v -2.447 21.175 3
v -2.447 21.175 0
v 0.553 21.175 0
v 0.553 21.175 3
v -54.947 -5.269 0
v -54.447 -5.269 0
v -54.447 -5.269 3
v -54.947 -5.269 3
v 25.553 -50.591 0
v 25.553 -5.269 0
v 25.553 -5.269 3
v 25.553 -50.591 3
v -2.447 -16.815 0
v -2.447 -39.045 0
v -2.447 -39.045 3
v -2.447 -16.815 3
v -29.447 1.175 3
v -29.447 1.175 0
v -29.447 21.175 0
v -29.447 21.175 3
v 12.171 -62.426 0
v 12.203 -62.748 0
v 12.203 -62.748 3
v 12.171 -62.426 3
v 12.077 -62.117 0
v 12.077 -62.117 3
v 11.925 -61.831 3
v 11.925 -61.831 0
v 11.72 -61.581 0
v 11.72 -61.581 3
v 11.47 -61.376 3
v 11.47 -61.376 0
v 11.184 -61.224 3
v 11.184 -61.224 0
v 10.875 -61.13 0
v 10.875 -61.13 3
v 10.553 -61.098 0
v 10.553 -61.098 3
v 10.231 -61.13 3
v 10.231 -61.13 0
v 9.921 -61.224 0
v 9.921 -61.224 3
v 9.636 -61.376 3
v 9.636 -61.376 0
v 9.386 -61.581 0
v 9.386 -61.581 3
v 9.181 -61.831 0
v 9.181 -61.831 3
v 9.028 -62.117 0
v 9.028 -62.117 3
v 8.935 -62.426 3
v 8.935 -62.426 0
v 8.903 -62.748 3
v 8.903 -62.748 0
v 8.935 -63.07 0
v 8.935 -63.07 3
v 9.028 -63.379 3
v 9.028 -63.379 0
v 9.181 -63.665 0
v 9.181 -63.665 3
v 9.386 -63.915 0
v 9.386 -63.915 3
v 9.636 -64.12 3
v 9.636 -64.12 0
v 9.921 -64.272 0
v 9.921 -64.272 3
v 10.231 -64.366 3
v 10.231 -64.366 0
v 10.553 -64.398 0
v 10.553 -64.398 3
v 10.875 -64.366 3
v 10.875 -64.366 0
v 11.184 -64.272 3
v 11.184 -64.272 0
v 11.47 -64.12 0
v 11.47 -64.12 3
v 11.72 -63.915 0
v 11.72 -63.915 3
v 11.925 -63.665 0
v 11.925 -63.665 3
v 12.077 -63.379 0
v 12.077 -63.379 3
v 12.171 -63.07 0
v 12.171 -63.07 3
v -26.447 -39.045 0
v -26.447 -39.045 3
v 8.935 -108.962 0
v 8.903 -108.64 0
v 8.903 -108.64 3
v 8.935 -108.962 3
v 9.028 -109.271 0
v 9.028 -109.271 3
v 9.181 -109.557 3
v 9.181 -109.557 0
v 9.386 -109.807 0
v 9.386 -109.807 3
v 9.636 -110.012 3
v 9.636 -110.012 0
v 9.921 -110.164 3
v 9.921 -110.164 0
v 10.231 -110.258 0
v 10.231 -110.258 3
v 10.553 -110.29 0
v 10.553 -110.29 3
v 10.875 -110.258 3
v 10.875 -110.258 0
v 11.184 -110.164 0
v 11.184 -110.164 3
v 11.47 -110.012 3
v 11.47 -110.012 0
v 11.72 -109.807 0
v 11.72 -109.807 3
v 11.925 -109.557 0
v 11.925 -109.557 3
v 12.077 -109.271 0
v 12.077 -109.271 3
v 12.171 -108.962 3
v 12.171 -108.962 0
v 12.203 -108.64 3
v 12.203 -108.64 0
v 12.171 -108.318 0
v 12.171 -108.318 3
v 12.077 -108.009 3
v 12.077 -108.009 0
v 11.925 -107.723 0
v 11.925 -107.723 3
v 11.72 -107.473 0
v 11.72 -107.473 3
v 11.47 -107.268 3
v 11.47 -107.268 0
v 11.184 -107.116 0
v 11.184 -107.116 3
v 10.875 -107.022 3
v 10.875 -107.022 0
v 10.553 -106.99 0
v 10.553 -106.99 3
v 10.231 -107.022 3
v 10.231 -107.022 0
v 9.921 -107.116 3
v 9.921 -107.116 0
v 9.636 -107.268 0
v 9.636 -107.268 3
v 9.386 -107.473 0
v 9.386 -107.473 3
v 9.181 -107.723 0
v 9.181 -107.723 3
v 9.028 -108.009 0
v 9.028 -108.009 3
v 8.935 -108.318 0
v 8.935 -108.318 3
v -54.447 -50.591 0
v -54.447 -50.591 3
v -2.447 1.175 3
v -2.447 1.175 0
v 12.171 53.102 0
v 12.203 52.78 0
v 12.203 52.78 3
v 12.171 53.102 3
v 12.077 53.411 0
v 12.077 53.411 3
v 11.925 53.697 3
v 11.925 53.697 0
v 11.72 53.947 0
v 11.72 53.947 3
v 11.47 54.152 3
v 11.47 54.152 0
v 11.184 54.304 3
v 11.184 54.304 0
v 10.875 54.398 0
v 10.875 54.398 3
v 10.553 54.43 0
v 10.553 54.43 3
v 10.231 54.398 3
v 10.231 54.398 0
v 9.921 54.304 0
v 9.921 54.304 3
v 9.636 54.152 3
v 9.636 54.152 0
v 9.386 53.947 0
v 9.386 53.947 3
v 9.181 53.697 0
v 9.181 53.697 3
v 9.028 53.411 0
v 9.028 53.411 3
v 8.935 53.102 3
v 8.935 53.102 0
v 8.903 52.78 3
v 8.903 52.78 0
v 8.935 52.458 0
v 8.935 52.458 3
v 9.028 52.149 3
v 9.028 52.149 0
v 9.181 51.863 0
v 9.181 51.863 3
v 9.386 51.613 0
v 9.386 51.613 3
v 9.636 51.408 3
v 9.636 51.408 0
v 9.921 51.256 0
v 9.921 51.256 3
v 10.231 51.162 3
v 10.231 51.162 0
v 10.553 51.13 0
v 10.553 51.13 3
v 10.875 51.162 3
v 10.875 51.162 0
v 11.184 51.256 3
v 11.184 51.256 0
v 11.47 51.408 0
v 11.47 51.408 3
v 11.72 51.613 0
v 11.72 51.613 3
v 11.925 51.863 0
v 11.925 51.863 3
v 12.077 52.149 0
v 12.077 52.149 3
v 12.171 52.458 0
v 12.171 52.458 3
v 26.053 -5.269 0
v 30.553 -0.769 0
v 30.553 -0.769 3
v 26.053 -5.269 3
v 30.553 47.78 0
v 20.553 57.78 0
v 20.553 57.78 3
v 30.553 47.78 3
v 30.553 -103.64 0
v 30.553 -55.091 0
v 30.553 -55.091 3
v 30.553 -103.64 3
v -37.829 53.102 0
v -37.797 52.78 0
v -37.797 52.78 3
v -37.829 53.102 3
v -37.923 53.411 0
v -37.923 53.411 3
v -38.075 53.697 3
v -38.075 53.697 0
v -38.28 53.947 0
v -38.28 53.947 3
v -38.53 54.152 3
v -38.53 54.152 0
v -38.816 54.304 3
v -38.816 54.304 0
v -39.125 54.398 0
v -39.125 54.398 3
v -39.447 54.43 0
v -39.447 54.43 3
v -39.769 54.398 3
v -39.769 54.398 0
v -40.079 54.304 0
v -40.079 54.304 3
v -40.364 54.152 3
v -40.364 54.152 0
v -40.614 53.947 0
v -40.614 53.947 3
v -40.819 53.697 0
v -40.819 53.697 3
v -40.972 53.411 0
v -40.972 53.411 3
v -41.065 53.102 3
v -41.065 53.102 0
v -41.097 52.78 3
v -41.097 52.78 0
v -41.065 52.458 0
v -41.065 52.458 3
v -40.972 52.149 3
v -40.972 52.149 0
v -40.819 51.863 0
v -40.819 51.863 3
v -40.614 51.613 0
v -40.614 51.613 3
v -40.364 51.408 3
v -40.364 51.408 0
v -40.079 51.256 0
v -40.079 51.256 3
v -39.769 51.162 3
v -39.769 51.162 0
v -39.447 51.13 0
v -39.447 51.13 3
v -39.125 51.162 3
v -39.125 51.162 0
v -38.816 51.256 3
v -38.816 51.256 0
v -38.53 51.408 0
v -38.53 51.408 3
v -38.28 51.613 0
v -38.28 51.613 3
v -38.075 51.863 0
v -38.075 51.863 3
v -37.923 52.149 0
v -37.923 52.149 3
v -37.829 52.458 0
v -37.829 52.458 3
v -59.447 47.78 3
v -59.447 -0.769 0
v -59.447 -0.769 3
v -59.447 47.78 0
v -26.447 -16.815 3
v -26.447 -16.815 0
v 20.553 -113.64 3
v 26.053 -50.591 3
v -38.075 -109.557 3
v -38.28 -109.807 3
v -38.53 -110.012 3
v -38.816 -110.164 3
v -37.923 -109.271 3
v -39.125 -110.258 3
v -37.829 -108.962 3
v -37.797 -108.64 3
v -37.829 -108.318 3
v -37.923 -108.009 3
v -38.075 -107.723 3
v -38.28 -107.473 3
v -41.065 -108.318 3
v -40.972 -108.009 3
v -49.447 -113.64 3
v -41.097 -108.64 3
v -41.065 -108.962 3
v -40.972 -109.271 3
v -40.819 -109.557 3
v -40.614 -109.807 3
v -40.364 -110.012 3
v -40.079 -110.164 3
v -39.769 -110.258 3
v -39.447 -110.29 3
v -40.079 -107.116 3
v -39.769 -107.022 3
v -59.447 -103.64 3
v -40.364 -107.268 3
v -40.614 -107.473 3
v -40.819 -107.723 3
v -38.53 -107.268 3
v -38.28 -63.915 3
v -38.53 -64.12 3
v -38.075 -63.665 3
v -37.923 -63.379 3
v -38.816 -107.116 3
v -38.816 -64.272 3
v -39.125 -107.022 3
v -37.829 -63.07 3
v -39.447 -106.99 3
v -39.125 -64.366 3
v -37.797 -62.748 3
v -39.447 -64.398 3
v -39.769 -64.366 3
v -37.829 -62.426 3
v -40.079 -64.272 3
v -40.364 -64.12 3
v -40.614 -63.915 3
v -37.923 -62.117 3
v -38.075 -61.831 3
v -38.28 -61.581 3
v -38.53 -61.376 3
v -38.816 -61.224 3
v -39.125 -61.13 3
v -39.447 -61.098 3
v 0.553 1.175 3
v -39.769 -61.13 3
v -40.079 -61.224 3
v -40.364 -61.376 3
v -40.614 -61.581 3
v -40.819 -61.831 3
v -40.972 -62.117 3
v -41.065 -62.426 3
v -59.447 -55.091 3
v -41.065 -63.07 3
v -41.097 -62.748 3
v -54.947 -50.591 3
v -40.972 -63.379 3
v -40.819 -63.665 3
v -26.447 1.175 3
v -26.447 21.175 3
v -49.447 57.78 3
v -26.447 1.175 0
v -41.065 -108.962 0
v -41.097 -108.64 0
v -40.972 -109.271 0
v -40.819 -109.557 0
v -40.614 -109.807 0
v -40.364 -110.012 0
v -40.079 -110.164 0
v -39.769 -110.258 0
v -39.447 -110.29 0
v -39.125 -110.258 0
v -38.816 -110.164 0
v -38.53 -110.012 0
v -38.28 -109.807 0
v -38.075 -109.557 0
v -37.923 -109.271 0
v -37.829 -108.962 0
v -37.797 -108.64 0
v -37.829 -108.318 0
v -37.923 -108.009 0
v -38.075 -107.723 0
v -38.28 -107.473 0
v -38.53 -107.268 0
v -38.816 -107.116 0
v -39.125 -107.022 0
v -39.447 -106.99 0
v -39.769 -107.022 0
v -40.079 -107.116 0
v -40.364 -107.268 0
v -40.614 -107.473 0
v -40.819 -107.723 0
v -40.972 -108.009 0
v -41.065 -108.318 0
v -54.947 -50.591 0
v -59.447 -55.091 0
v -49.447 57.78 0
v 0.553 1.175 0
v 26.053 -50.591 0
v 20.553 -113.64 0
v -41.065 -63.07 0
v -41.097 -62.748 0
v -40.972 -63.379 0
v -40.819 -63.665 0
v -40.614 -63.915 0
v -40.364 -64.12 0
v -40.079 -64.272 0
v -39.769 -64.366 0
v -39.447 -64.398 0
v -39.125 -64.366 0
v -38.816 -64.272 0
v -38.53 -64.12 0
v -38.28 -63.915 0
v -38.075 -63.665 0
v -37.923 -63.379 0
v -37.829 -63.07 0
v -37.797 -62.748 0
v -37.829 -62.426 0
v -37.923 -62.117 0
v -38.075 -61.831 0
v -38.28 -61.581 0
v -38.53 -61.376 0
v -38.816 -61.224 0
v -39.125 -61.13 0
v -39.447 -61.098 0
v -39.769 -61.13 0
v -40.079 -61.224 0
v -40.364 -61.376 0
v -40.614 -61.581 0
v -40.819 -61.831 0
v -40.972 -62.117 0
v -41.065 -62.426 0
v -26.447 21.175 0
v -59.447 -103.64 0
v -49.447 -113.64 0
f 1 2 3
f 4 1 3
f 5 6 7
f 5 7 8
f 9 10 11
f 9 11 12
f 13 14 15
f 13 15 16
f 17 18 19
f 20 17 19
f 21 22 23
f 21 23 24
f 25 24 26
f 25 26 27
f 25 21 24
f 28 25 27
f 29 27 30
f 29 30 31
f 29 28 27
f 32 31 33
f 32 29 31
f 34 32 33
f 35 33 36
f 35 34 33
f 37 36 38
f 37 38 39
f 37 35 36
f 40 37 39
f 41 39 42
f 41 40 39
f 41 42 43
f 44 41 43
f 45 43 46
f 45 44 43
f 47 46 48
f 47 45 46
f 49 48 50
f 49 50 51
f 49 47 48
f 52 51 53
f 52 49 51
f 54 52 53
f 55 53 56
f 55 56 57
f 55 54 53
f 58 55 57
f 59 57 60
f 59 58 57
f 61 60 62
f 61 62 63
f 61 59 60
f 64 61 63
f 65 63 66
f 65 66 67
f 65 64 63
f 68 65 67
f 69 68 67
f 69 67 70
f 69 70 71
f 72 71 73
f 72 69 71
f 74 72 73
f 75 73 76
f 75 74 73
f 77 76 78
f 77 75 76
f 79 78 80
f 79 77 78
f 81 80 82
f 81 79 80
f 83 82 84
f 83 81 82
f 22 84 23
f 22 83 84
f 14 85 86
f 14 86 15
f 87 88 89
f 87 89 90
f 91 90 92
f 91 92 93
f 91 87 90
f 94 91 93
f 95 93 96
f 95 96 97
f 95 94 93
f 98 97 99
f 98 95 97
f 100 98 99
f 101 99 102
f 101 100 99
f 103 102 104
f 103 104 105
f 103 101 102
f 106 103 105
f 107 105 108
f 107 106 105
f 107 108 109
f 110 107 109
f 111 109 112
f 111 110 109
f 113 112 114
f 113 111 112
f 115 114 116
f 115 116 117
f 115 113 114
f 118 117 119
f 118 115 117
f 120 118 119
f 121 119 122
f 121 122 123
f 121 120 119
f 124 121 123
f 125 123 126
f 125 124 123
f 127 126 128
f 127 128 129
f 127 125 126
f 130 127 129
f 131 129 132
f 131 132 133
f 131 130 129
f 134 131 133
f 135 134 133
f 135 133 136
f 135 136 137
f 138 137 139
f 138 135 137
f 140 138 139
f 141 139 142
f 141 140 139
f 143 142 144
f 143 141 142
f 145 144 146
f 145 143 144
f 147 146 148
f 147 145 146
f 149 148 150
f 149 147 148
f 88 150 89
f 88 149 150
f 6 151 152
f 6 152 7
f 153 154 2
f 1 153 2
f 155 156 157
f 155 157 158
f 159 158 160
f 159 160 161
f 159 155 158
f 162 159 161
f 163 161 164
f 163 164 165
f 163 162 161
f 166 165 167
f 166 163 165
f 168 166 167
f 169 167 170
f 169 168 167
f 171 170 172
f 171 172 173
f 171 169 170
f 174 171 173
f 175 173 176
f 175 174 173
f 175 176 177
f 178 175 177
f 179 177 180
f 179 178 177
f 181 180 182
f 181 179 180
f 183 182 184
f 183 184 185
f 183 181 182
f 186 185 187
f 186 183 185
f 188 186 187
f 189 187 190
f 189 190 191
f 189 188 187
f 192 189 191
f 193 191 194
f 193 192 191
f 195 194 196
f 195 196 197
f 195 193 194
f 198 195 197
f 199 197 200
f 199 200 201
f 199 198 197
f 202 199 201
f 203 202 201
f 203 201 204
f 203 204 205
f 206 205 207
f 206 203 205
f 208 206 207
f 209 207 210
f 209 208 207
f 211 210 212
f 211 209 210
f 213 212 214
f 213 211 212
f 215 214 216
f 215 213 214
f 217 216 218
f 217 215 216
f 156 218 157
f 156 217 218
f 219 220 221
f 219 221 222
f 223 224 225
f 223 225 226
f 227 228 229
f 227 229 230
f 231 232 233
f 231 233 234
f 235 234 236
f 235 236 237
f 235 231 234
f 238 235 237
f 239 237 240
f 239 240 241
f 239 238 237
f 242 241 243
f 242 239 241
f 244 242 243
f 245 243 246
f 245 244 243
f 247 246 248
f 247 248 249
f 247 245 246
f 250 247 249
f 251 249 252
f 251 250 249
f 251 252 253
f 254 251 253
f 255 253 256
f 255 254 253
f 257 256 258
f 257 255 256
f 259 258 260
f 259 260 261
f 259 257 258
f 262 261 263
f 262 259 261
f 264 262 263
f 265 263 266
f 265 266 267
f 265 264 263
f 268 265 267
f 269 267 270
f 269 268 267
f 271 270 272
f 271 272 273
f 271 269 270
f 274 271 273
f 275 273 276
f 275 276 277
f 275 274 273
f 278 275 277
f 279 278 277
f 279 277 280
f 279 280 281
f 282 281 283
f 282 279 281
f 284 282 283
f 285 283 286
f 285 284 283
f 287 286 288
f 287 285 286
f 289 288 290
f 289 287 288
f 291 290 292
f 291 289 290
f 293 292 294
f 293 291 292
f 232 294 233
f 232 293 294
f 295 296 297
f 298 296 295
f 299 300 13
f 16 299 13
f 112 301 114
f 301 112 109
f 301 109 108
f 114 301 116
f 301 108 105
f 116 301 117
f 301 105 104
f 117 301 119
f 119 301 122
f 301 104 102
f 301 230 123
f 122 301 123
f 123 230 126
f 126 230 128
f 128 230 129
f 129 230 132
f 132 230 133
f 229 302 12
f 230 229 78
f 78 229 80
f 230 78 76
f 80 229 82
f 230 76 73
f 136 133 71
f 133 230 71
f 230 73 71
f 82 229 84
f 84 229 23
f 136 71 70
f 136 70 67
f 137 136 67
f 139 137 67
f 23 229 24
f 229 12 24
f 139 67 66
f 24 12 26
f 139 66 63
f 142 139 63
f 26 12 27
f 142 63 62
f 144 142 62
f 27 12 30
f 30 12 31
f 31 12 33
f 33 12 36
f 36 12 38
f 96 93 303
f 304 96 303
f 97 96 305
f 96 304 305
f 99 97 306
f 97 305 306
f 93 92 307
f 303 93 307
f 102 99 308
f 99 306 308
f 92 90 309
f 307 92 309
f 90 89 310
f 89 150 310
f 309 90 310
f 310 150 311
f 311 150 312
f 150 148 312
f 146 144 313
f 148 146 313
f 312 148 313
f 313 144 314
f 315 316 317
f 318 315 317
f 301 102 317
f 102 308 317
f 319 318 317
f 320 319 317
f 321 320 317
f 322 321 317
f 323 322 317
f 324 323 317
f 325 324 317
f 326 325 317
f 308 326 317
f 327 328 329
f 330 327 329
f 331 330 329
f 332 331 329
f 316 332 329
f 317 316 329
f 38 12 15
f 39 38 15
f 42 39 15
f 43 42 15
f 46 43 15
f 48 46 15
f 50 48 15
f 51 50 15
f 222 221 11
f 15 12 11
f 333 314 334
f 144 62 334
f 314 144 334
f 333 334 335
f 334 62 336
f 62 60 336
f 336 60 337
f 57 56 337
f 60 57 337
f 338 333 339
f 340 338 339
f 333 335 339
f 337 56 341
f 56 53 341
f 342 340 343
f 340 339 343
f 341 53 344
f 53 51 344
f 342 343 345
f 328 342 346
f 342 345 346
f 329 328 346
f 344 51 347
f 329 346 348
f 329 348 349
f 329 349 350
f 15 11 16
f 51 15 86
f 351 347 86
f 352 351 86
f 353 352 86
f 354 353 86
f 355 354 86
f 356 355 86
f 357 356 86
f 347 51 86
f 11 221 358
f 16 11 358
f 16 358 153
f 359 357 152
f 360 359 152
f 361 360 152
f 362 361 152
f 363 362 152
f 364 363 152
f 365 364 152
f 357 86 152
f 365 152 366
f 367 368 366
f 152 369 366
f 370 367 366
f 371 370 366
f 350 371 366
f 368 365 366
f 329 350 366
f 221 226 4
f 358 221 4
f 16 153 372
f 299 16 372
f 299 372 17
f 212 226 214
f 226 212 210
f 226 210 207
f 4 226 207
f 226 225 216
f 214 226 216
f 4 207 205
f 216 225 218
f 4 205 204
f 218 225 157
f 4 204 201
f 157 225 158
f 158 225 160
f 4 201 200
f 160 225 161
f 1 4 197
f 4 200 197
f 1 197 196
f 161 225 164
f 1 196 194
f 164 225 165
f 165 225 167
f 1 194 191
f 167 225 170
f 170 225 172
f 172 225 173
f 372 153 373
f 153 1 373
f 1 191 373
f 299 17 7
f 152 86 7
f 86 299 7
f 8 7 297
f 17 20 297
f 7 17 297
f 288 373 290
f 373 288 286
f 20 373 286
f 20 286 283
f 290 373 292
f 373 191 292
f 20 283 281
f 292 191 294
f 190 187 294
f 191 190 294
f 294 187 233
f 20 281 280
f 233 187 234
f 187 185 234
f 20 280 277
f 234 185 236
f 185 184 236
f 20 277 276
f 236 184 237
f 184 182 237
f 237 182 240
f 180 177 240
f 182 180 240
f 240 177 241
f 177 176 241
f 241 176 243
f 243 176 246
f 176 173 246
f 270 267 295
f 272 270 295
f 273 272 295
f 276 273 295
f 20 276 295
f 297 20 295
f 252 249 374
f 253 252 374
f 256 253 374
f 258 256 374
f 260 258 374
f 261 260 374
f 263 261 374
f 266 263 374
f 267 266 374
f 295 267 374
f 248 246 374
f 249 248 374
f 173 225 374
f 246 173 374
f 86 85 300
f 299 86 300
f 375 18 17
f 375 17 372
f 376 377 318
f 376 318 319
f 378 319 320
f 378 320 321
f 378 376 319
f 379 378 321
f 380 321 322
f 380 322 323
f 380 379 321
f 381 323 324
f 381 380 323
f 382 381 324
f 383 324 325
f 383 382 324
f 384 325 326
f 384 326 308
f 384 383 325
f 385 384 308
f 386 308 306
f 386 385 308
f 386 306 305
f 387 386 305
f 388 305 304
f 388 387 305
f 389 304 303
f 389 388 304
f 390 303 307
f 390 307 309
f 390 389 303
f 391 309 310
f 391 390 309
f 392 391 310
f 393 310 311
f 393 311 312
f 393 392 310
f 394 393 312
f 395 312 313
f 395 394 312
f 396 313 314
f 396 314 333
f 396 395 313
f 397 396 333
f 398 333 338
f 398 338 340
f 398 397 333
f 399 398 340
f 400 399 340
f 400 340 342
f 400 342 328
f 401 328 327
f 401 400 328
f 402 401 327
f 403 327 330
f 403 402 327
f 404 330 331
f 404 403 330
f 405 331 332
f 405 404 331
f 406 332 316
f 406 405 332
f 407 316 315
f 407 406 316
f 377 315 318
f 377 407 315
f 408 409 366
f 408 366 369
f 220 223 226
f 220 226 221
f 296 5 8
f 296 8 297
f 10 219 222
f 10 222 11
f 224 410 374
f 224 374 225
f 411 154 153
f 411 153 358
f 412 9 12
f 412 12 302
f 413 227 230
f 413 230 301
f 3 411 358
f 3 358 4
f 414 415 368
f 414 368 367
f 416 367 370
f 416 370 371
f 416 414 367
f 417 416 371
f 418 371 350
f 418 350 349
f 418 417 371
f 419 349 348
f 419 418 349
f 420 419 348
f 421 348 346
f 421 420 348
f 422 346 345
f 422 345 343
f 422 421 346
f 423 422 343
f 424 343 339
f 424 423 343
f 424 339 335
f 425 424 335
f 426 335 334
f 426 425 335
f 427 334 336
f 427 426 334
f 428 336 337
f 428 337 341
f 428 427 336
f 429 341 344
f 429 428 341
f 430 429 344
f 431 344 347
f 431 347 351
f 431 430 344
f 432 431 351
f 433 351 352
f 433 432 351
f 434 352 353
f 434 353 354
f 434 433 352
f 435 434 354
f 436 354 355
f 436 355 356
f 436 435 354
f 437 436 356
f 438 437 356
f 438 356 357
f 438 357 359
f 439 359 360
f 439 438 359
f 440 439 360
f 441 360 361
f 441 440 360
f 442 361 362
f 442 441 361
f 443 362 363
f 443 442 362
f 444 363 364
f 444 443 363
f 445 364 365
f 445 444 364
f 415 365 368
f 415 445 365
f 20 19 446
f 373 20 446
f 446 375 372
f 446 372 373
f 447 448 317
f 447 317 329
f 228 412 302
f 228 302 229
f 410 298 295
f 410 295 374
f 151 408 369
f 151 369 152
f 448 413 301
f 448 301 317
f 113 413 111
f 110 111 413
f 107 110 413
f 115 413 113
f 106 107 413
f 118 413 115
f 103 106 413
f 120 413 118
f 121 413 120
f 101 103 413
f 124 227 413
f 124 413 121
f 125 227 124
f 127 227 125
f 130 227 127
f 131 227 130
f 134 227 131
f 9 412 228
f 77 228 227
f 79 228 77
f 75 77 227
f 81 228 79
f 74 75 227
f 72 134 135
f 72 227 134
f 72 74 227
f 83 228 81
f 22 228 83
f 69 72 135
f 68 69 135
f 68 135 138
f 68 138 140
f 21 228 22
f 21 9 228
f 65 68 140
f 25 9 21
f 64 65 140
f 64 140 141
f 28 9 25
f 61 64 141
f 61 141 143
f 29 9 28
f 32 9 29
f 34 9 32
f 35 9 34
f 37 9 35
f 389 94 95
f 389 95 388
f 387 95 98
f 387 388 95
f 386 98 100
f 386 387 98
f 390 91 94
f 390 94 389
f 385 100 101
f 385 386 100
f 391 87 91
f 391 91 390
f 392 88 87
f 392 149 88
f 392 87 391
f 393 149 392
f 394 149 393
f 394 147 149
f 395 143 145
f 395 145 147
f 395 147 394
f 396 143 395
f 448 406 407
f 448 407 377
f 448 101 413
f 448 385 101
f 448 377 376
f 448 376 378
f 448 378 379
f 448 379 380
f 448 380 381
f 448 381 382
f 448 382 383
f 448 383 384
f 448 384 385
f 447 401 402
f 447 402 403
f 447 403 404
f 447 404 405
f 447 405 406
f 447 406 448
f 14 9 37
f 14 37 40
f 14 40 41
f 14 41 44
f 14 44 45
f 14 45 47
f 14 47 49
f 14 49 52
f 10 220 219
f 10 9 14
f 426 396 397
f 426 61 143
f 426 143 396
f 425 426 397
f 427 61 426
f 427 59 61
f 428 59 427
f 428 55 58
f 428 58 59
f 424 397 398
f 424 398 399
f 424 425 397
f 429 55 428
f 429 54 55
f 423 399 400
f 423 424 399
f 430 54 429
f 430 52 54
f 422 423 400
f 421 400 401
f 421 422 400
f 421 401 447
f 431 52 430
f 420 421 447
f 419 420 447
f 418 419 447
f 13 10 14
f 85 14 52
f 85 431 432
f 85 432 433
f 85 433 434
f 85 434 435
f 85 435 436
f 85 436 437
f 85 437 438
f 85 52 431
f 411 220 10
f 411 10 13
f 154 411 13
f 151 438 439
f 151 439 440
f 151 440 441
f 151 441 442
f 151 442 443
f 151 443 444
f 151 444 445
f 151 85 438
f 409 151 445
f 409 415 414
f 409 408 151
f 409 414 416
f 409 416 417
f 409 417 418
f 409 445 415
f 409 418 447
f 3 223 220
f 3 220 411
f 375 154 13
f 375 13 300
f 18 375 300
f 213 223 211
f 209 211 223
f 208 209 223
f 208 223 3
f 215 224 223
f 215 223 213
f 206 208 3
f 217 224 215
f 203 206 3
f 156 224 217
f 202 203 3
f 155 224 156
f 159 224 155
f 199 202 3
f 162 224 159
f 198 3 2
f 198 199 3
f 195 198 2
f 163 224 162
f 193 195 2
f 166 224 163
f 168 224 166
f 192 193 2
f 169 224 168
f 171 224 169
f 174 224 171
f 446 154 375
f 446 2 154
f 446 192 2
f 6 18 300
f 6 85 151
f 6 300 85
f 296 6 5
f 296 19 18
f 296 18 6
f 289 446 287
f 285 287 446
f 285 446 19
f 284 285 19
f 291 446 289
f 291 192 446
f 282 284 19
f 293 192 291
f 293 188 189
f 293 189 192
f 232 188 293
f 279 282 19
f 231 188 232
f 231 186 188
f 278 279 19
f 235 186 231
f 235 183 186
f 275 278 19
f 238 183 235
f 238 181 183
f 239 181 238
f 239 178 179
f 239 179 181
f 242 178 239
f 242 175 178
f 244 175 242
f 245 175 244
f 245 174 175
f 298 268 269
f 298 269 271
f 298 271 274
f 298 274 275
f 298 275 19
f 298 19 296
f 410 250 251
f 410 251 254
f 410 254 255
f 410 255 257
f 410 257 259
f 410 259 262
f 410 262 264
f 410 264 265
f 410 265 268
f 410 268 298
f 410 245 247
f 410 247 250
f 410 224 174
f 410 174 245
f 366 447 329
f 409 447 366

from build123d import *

# Parameters (mm, degrees)
SKETCH1_R           = 1.65
SKETCH1_W           = 3
SKETCH1_H           = 20
SKETCH1_W_2         = 24
SKETCH1_H_2         = 22.230872535
BOSS_EXTRUDE2_DEPTH = 3


with BuildPart() as part:
    # Sketch1 → Boss-Extrude2 (new body)
    with BuildSketch(Plane.XY):
        Polygon((-59.447183423, 47.780041818), (-49.447183423, 57.780041818), (20.552816577, 57.780041818), (30.552816577, 47.780041818), (30.552816577, -0.7691812), (26.052816577, -5.2691812), (25.552816577, -5.2691812), (25.552816577, -50.590735163), (26.052816577, -50.590735163), (30.552816577, -55.090735163), (30.552816577, -103.639958182), (20.552816577, -113.639958182), (-49.447183423, -113.639958182), (-59.447183423, -103.639958182), (-59.447183423, -55.090735163), (-54.947183423, -50.590735163), (-54.447183423, -50.590735163), (-54.447183423, -5.2691812), (-54.947183423, -5.2691812), (-59.447183423, -0.7691812), align=None)
        with Locations((-39.447183423, 52.780041818)):
            Circle(SKETCH1_R, mode=Mode.SUBTRACT)
        with Locations((10.552816577, 52.780041818)):
            Circle(SKETCH1_R, mode=Mode.SUBTRACT)
        with Locations(Location((10.552816577, -108.639958182, 0), (0, 0, 180))):
            Circle(SKETCH1_R, mode=Mode.SUBTRACT)
        with Locations(Location((-39.447183423, -108.639958182, 0), (0, 0, 180))):
            Circle(SKETCH1_R, mode=Mode.SUBTRACT)
        with Locations((10.552816577, -62.748057161)):
            Circle(SKETCH1_R, mode=Mode.SUBTRACT)
        with Locations(Location((-39.447183423, -62.748057161, 0), (0, 0, 180))):
            Circle(SKETCH1_R, mode=Mode.SUBTRACT)
        with Locations((-27.947183423, 11.175041818)):
            Rectangle(SKETCH1_W, SKETCH1_H, mode=Mode.SUBTRACT)
        with Locations((-0.947183423, 11.175041818)):
            Rectangle(SKETCH1_W, SKETCH1_H, mode=Mode.SUBTRACT)
        with Locations((-14.447183423, -27.929958181)):
            Rectangle(SKETCH1_W_2, SKETCH1_H_2, mode=Mode.SUBTRACT)
    extrude(amount=BOSS_EXTRUDE2_DEPTH)


solid = part.part
